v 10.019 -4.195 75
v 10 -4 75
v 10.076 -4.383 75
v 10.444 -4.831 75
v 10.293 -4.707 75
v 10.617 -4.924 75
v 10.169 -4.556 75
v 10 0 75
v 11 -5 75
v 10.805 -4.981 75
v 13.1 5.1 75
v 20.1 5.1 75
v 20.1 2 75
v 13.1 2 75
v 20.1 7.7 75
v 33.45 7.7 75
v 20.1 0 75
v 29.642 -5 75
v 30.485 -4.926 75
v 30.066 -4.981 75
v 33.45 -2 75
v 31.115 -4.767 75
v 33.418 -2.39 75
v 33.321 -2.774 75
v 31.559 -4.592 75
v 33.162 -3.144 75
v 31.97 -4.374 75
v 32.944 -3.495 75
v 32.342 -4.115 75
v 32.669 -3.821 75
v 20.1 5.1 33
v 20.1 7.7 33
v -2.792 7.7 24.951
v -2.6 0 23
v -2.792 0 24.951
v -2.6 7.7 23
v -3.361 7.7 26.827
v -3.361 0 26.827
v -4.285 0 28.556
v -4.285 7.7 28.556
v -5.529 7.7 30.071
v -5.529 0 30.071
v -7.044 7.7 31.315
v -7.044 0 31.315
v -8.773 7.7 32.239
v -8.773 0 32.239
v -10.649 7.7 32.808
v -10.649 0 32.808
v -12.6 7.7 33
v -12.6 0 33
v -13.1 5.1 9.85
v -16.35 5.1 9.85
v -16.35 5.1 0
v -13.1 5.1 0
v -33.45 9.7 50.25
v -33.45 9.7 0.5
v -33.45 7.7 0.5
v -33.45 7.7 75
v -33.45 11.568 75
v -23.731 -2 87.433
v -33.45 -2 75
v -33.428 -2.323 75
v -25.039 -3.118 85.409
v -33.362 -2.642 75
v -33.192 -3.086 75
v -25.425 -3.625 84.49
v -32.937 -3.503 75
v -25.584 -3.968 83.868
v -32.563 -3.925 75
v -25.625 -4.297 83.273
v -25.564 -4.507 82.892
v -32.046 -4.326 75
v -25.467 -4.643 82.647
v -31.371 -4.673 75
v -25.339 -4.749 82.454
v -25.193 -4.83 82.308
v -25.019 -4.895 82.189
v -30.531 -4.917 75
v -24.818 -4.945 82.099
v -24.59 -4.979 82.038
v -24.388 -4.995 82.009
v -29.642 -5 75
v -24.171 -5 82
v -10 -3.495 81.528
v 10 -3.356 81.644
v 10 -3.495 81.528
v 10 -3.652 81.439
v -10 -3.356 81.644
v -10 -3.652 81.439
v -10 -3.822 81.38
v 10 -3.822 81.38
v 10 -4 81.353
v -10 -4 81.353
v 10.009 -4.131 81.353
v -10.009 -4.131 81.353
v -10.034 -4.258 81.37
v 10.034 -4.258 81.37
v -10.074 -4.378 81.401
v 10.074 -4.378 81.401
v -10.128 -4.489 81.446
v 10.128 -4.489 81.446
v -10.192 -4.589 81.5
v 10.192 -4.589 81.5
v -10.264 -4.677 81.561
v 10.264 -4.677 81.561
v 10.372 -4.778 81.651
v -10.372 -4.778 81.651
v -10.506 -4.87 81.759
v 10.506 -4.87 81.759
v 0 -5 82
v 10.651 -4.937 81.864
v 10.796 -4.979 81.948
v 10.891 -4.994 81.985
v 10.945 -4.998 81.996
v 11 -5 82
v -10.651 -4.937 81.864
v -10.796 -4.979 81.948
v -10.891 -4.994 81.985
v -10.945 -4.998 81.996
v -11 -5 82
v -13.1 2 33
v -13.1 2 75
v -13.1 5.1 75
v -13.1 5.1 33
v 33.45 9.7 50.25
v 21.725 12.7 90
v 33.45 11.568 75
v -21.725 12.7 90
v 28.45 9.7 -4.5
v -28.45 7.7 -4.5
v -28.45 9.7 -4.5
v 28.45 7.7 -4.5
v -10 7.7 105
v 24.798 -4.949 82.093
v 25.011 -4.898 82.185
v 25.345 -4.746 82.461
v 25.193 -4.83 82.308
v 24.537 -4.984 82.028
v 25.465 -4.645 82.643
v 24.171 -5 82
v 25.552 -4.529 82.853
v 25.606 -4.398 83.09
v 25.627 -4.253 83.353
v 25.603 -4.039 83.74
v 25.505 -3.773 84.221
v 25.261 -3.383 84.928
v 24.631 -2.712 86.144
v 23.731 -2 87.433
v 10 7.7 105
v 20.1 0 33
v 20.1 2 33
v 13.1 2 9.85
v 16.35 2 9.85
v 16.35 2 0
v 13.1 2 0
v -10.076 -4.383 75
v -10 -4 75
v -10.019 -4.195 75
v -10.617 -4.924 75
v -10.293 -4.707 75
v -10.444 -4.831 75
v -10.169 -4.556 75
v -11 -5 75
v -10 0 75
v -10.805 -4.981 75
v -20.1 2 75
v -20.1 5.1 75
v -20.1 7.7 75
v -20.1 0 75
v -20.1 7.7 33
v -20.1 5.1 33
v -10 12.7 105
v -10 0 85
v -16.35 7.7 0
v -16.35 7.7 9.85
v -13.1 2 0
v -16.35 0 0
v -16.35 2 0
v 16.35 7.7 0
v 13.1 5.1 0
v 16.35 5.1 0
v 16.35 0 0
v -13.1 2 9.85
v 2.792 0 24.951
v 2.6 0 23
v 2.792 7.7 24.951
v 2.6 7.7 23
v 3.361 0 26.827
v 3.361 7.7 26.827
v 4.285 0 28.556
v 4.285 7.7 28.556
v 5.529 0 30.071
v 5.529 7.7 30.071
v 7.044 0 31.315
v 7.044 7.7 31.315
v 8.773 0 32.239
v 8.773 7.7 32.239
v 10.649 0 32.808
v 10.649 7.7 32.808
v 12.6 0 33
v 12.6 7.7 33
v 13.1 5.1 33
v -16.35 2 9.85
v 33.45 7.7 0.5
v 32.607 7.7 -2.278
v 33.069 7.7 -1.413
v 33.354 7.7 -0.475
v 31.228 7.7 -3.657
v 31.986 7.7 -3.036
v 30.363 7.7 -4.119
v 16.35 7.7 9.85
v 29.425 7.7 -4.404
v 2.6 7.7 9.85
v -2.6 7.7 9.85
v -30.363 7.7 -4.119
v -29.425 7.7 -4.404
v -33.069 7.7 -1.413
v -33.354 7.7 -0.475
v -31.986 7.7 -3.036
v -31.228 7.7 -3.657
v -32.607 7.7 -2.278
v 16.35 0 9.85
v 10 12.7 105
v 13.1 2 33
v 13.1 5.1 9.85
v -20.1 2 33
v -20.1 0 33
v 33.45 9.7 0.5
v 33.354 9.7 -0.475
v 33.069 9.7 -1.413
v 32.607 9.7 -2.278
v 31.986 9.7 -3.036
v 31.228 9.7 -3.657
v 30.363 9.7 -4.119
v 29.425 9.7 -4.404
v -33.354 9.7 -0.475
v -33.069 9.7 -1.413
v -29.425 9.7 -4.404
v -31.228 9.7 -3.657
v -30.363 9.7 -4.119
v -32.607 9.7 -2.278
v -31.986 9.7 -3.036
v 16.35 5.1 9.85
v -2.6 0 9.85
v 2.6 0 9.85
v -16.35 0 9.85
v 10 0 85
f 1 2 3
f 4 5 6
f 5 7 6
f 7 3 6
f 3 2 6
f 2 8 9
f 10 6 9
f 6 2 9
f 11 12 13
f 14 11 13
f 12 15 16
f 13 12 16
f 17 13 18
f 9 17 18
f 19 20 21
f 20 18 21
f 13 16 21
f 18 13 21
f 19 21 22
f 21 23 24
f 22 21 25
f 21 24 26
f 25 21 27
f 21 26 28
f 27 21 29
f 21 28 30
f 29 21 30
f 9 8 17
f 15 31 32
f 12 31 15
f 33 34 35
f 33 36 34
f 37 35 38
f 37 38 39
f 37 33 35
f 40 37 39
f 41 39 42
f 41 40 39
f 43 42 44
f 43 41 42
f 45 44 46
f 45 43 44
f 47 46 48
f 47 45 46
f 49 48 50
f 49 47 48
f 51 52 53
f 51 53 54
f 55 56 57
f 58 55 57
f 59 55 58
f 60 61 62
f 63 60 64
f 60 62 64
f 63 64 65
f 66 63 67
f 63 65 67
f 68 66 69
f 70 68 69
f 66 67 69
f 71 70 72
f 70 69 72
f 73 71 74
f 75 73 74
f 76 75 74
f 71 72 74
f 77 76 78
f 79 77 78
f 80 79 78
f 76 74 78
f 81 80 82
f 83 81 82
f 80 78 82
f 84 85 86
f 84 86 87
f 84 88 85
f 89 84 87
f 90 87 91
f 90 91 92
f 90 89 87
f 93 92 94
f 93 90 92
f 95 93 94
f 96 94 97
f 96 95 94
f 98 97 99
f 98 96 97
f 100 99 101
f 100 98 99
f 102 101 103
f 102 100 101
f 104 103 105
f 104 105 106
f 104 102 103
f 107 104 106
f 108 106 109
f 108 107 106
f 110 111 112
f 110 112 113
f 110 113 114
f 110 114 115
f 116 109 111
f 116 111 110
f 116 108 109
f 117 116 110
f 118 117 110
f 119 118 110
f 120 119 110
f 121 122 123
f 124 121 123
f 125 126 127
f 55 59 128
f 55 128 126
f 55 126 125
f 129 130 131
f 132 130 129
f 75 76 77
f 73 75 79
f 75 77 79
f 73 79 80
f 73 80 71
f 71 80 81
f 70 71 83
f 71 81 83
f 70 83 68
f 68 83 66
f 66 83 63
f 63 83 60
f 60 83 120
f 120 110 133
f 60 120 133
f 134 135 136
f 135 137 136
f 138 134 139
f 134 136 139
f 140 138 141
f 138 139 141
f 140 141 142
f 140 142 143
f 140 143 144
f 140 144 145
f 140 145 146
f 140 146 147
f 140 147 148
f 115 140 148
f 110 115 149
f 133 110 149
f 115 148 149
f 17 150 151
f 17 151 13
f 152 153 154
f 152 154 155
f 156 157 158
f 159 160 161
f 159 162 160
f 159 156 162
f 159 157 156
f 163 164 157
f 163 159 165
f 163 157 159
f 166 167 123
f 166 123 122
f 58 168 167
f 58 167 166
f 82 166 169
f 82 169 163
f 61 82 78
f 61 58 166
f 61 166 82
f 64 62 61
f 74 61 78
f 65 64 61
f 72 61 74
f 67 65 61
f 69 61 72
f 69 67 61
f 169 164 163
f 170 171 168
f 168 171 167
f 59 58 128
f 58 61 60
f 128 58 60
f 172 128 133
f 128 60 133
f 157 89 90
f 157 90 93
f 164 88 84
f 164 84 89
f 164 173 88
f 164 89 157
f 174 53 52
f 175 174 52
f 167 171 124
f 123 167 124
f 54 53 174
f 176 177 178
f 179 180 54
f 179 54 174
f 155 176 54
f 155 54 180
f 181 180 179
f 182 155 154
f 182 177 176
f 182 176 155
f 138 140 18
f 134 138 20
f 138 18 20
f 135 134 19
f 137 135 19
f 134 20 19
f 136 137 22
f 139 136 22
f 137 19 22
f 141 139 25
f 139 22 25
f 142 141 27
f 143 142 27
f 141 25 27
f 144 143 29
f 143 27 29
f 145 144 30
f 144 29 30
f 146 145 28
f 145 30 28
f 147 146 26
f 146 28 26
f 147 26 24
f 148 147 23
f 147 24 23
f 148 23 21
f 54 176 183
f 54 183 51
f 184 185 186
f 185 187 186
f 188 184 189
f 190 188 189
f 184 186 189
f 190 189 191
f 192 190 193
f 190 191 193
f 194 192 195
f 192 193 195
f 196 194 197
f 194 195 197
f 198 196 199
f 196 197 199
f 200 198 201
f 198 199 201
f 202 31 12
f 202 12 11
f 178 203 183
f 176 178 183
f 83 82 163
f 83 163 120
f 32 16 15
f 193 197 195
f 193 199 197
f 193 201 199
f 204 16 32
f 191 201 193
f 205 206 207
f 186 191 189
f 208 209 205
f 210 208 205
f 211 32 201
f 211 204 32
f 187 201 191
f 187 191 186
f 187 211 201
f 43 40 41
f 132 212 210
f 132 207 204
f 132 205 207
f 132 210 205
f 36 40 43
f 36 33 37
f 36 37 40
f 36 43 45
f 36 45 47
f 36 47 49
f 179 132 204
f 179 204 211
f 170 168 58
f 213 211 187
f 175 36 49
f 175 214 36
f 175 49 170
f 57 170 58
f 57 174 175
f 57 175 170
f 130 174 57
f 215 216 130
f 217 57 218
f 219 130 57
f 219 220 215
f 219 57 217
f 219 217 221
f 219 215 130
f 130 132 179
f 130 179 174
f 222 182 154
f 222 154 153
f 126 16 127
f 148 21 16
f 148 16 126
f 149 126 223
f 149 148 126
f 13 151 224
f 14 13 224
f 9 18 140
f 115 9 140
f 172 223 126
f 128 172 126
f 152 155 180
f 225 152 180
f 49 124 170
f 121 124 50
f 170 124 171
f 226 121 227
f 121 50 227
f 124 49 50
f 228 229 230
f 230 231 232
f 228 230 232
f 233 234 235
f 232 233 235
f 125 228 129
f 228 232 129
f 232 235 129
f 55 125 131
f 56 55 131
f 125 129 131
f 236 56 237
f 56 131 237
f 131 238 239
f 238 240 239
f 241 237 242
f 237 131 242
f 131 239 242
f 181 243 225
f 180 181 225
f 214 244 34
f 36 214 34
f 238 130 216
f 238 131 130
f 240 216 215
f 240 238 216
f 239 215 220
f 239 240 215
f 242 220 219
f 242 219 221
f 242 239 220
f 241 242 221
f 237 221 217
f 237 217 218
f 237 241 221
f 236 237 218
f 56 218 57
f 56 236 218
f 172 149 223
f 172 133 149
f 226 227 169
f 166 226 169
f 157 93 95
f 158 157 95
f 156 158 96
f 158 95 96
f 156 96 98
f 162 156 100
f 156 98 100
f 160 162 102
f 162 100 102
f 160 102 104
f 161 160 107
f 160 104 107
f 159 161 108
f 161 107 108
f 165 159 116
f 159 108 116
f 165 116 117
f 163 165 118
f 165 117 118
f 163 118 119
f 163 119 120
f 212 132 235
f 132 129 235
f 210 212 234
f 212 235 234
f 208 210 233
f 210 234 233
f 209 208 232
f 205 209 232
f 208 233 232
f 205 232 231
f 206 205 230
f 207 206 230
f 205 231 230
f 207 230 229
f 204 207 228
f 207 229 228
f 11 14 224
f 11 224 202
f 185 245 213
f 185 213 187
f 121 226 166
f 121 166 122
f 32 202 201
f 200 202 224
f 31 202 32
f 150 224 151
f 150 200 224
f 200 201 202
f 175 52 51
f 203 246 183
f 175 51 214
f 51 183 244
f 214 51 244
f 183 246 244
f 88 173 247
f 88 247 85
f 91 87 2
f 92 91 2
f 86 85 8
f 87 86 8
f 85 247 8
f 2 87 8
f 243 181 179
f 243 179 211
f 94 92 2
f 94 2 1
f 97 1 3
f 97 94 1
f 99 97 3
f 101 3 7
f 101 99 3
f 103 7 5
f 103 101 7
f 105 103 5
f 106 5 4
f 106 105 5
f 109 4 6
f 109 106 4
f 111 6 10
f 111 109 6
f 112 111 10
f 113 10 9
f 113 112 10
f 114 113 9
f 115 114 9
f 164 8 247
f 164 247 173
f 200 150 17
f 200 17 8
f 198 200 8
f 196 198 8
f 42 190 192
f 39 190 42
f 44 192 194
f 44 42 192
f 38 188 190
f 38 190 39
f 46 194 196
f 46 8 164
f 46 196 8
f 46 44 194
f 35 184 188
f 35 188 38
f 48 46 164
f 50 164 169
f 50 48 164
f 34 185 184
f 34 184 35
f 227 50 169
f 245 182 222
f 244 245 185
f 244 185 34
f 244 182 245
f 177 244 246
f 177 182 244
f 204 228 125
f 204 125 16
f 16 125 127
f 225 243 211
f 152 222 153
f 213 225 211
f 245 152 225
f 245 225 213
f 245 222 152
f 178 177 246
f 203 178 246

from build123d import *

# Parameters (mm, degrees)
BOSS_EXTRUDE1_DEPTH     = 7.7
SKETCH2_W               = 7
SKETCH2_H               = 3.1
CUT_EXTRUDE1_DEPTH      = 79.027559234
FILLET1_R               = 10
BOSS_EXTRUDE2_DEPTH     = 2
BOSS_EXTRUDE3_DEPTH     = 33.45
BOSS_EXTRUDE4_REACH     = 112.929
CUT_EXTRUDE2_DEPTH      = 111.928772192
CUT_EXTRUDE2_DEPTH_BACK = 111.928772192
CUT_EXTRUDE3_DEPTH      = 10
FILLET3_R               = 1
FILLET4_R               = 5
FILLET5_R               = 3


with BuildPart() as part:
    # Sketch1 → Boss-Extrude1 (new body)
    with BuildSketch(Plane(origin=(0, 0, 0), x_dir=(1, 0, 0), z_dir=(0, 1, 0))):
        Polygon((0, 0), (-16.35, 0), (-16.35, -9.85), (-2.6, -9.85), (-2.6, -33), (-20.1, -33), (-20.1, -75), (0, -75), align=None)
    extrude(amount=BOSS_EXTRUDE1_DEPTH)

    # Sketch2 → Cut-Extrude1 (cut, through all)
    with BuildSketch(Plane.XY.offset(75)):
        with Locations((-16.6, 3.55)):
            Rectangle(SKETCH2_W, SKETCH2_H)
    extrude(amount=-CUT_EXTRUDE1_DEPTH, mode=Mode.SUBTRACT)

    # Fillet1
    fillet1_edges = [part.edges().sort_by_distance(p)[0] for p in [
        (-2.6, 3.85, 33),
    ]]
    fillet(fillet1_edges, radius=FILLET1_R)

    # Sketch3 → Boss-Extrude2 (add)
    with BuildSketch(Plane(origin=(0, 7.7, 0), x_dir=(1, 0, 0), z_dir=(0, 1, 0))):
        Polygon((0, 4.5), (-33.45, 4.5), (-33.45, -75), (-10, -105), (0, -105), align=None)
    extrude(amount=BOSS_EXTRUDE2_DEPTH)

    # Sketch4 → Boss-Extrude3 (add)
    with BuildSketch(Plane(origin=(0, 0, 0), x_dir=(0, 0, -1), z_dir=(1, 0, 0))):
        Polygon((-105, 9.7), (-105, 12.7), (-90, 12.7), (-50.25, 9.7), align=None)
    extrude(amount=-BOSS_EXTRUDE3_DEPTH)

    # Boss-Extrude4: up to this face of the body (flat: up to its plane)
    boss_extrude4_end = Plane(part.part.faces().sort_by_distance((0, 5.848980441, 46.191947566))[0])
    # Sketch5 → Boss-Extrude4 (add, up to the picked face)
    with BuildSketch(Plane.ZY.offset(33.45), mode=Mode.PRIVATE) as boss_extrude4_sk1:
        Polygon((75, 7.7), (75, -5), (82, -5), (105, 7.7), align=None)
    boss_extrude4_tool1 = split(extrude(boss_extrude4_sk1.sketch, amount=-BOSS_EXTRUDE4_REACH, mode=Mode.PRIVATE), bisect_by=boss_extrude4_end, keep=Keep.BOTH, mode=Mode.PRIVATE)
    add(boss_extrude4_tool1.solids().sort_by(Axis((-33.45, 2.665766, 85.441441), (1, 0, 0)))[0])

    # Sketch6 → Cut-Extrude2 (cut, two sides: drawn at the far end of the back side and taken through both)
    with BuildSketch(Plane(origin=(0, 7.7, 0), x_dir=(1, 0, 0), z_dir=(0, 1, 0)).offset(-CUT_EXTRUDE2_DEPTH_BACK)):
        Polygon((-33.45, -75), (-10, -105), (-33.45, -105), align=None)
    extrude(amount=CUT_EXTRUDE2_DEPTH + CUT_EXTRUDE2_DEPTH_BACK, mode=Mode.SUBTRACT)

    # Sketch7 → Cut-Extrude3 (cut)
    with BuildSketch(Plane(origin=(0, 0, 0), x_dir=(0, 0, -1), z_dir=(1, 0, 0))):
        Polygon((-75, 0), (-85, 0), (-80, -5), (-75, -5), align=None)
    extrude(amount=-CUT_EXTRUDE3_DEPTH, mode=Mode.SUBTRACT)

    # Fillet3
    # the kernel refuses this fillet: 1 mm, written as the material it takes off along each edge
    with BuildSketch(Plane(origin=(5.810983209, -5, 80), x_dir=(0, 0, 1), z_dir=(-1, 0, 0))) as fillet3_piece_1:
        with BuildLine():
            CenterArc((2.350701034, 0.936487472), FILLET3_R, 135, 114.469800521)
            Line((1.643594253, 1.643594253), (1.629452117, 1.657736389))
            Line((1.629452117, 1.657736389), (-0.014142136, 0.014142136))
            Line((-0.014142136, 0.014142136), (0, -0.02))
            ThreePointArc((0, -0.02), (1, -0.02), (1.992985979, -0.018729749))
            Line((1.992985979, -0.018729749), (2, 0))
        make_face()
    extrude(amount=15.810983209, mode=Mode.SUBTRACT)
    with BuildSketch(Plane(origin=(-10, -5, 82.5), x_dir=(-1, 0, 0), z_dir=(0, 0, -1))) as fillet3_piece_2_section:
        with BuildLine():
            CenterArc((FILLET3_R, FILLET3_R), FILLET3_R, 180, 90)
            Line((0, FILLET3_R), (-FILLET3_R * 0.02, FILLET3_R))
            Line((-FILLET3_R * 0.02, FILLET3_R), (-FILLET3_R * 0.02, -FILLET3_R * 0.02))
            Line((-FILLET3_R * 0.02, -FILLET3_R * 0.02), (FILLET3_R, -FILLET3_R * 0.02))
            Line((FILLET3_R, -FILLET3_R * 0.02), (FILLET3_R, 0))
        make_face()
    fillet3_piece_2 = extrude(amount=10, mode=Mode.PRIVATE)
    fillet3_piece_2 = split(fillet3_piece_2, bisect_by=Plane(origin=(-10.222841489, -6.700692184, 78.299307816), z_dir=(0, 0.7071067811865466, -0.7071067811865485)), keep=Keep.TOP, mode=Mode.PRIVATE)
    add(fillet3_piece_2, mode=Mode.SUBTRACT)
    with BuildSketch(Plane(origin=(5.810983209, -5, 80), x_dir=(0, 0, 1), z_dir=(-1, 0, 0))) as fillet3_piece_3a_section:
        with BuildLine():
            CenterArc((2.350701034, 0.936487472), FILLET3_R, 135, 114.469800521)
            Line((1.643594253, 1.643594253), (1.629452117, 1.657736389))
            Line((1.629452117, 1.657736389), (-0.014142136, 0.014142136))
            Line((-0.014142136, 0.014142136), (0, -0.02))
            ThreePointArc((0, -0.02), (1, -0.02), (1.992985979, -0.018729749))
            Line((1.992985979, -0.018729749), (2, 0))
        make_face()
    fillet3_piece_3a = extrude(amount=21.621966417, mode=Mode.PRIVATE)
    fillet3_piece_3a = split(fillet3_piece_3a, bisect_by=Plane(origin=(-10, -4.567151235, 80.996776665), z_dir=(-1, 0, 0)), keep=Keep.TOP, mode=Mode.PRIVATE)
    with BuildSketch(Plane(origin=(-10, -5, 82.5), x_dir=(-1, 0, 0), z_dir=(0, 0, -1))) as fillet3_piece_3b_section:
        with BuildLine():
            CenterArc((FILLET3_R, FILLET3_R), FILLET3_R, 180, 90)
            Line((0, FILLET3_R), (-FILLET3_R * 0.02, FILLET3_R))
            Line((-FILLET3_R * 0.02, FILLET3_R), (-FILLET3_R * 0.02, -FILLET3_R * 0.02))
            Line((-FILLET3_R * 0.02, -FILLET3_R * 0.02), (FILLET3_R, -FILLET3_R * 0.02))
            Line((FILLET3_R, -FILLET3_R * 0.02), (FILLET3_R, 0))
        make_face()
    fillet3_piece_3b = extrude(amount=10, mode=Mode.PRIVATE)
    fillet3_piece_3b = split(fillet3_piece_3b, bisect_by=Plane(origin=(-10.238471404, -4.220535034, 80.779464966), z_dir=(0, -0.7071067811865466, 0.7071067811865485)), keep=Keep.TOP, mode=Mode.PRIVATE)
    fillet3_piece_3 = fillet3_piece_3a & fillet3_piece_3b
    add(fillet3_piece_3, mode=Mode.SUBTRACT)

    # Fillet4
    fillet4_edges = [part.edges().sort_by_distance(p)[0] for p in [
        (-33.45, 8.7, -4.5),
    ]]
    fillet(fillet4_edges, radius=FILLET4_R)

    # Mirror1: part across plane


with BuildPart() as part_1:
    add(part.part)
    add(part.part.mirror(Plane(origin=(0, 7.7, 75), x_dir=(0, 0, 1), z_dir=(-1, 0, 0))))

    # Fillet5
    # the kernel refuses this fillet: 3 mm, written as the material it takes off along each edge
    with BuildSketch(Plane(origin=(-38.068859068, -5, 69.091011854), x_dir=(0.7878650861711843, 0, -0.6158478756904764), z_dir=(0.6158478756904763, 0, 0.7878650861711843))) as fillet5_piece_1:
        with BuildLine():
            CenterArc((FILLET5_R, FILLET5_R), FILLET5_R, 180, 90)
            Line((0, FILLET5_R), (0, 0))
            Line((0, 0), (FILLET5_R, 0))
        make_face()
    extrude(amount=23.884769896, mode=Mode.SUBTRACT)
    with BuildSketch(Plane(origin=(38.068859068, -5, 69.091011854), x_dir=(-0.7878650861711843, 0, -0.6158478756904764), z_dir=(-0.6158478756904763, 0, 0.7878650861711843))) as fillet5_piece_2:
        with BuildLine():
            CenterArc((FILLET5_R, -FILLET5_R), FILLET5_R, 90, 90)
            Line((0, -FILLET5_R), (0, 0))
            Line((0, 0), (FILLET5_R, 0))
        make_face()
    extrude(amount=23.884769896, mode=Mode.SUBTRACT)


solid = part_1.part
